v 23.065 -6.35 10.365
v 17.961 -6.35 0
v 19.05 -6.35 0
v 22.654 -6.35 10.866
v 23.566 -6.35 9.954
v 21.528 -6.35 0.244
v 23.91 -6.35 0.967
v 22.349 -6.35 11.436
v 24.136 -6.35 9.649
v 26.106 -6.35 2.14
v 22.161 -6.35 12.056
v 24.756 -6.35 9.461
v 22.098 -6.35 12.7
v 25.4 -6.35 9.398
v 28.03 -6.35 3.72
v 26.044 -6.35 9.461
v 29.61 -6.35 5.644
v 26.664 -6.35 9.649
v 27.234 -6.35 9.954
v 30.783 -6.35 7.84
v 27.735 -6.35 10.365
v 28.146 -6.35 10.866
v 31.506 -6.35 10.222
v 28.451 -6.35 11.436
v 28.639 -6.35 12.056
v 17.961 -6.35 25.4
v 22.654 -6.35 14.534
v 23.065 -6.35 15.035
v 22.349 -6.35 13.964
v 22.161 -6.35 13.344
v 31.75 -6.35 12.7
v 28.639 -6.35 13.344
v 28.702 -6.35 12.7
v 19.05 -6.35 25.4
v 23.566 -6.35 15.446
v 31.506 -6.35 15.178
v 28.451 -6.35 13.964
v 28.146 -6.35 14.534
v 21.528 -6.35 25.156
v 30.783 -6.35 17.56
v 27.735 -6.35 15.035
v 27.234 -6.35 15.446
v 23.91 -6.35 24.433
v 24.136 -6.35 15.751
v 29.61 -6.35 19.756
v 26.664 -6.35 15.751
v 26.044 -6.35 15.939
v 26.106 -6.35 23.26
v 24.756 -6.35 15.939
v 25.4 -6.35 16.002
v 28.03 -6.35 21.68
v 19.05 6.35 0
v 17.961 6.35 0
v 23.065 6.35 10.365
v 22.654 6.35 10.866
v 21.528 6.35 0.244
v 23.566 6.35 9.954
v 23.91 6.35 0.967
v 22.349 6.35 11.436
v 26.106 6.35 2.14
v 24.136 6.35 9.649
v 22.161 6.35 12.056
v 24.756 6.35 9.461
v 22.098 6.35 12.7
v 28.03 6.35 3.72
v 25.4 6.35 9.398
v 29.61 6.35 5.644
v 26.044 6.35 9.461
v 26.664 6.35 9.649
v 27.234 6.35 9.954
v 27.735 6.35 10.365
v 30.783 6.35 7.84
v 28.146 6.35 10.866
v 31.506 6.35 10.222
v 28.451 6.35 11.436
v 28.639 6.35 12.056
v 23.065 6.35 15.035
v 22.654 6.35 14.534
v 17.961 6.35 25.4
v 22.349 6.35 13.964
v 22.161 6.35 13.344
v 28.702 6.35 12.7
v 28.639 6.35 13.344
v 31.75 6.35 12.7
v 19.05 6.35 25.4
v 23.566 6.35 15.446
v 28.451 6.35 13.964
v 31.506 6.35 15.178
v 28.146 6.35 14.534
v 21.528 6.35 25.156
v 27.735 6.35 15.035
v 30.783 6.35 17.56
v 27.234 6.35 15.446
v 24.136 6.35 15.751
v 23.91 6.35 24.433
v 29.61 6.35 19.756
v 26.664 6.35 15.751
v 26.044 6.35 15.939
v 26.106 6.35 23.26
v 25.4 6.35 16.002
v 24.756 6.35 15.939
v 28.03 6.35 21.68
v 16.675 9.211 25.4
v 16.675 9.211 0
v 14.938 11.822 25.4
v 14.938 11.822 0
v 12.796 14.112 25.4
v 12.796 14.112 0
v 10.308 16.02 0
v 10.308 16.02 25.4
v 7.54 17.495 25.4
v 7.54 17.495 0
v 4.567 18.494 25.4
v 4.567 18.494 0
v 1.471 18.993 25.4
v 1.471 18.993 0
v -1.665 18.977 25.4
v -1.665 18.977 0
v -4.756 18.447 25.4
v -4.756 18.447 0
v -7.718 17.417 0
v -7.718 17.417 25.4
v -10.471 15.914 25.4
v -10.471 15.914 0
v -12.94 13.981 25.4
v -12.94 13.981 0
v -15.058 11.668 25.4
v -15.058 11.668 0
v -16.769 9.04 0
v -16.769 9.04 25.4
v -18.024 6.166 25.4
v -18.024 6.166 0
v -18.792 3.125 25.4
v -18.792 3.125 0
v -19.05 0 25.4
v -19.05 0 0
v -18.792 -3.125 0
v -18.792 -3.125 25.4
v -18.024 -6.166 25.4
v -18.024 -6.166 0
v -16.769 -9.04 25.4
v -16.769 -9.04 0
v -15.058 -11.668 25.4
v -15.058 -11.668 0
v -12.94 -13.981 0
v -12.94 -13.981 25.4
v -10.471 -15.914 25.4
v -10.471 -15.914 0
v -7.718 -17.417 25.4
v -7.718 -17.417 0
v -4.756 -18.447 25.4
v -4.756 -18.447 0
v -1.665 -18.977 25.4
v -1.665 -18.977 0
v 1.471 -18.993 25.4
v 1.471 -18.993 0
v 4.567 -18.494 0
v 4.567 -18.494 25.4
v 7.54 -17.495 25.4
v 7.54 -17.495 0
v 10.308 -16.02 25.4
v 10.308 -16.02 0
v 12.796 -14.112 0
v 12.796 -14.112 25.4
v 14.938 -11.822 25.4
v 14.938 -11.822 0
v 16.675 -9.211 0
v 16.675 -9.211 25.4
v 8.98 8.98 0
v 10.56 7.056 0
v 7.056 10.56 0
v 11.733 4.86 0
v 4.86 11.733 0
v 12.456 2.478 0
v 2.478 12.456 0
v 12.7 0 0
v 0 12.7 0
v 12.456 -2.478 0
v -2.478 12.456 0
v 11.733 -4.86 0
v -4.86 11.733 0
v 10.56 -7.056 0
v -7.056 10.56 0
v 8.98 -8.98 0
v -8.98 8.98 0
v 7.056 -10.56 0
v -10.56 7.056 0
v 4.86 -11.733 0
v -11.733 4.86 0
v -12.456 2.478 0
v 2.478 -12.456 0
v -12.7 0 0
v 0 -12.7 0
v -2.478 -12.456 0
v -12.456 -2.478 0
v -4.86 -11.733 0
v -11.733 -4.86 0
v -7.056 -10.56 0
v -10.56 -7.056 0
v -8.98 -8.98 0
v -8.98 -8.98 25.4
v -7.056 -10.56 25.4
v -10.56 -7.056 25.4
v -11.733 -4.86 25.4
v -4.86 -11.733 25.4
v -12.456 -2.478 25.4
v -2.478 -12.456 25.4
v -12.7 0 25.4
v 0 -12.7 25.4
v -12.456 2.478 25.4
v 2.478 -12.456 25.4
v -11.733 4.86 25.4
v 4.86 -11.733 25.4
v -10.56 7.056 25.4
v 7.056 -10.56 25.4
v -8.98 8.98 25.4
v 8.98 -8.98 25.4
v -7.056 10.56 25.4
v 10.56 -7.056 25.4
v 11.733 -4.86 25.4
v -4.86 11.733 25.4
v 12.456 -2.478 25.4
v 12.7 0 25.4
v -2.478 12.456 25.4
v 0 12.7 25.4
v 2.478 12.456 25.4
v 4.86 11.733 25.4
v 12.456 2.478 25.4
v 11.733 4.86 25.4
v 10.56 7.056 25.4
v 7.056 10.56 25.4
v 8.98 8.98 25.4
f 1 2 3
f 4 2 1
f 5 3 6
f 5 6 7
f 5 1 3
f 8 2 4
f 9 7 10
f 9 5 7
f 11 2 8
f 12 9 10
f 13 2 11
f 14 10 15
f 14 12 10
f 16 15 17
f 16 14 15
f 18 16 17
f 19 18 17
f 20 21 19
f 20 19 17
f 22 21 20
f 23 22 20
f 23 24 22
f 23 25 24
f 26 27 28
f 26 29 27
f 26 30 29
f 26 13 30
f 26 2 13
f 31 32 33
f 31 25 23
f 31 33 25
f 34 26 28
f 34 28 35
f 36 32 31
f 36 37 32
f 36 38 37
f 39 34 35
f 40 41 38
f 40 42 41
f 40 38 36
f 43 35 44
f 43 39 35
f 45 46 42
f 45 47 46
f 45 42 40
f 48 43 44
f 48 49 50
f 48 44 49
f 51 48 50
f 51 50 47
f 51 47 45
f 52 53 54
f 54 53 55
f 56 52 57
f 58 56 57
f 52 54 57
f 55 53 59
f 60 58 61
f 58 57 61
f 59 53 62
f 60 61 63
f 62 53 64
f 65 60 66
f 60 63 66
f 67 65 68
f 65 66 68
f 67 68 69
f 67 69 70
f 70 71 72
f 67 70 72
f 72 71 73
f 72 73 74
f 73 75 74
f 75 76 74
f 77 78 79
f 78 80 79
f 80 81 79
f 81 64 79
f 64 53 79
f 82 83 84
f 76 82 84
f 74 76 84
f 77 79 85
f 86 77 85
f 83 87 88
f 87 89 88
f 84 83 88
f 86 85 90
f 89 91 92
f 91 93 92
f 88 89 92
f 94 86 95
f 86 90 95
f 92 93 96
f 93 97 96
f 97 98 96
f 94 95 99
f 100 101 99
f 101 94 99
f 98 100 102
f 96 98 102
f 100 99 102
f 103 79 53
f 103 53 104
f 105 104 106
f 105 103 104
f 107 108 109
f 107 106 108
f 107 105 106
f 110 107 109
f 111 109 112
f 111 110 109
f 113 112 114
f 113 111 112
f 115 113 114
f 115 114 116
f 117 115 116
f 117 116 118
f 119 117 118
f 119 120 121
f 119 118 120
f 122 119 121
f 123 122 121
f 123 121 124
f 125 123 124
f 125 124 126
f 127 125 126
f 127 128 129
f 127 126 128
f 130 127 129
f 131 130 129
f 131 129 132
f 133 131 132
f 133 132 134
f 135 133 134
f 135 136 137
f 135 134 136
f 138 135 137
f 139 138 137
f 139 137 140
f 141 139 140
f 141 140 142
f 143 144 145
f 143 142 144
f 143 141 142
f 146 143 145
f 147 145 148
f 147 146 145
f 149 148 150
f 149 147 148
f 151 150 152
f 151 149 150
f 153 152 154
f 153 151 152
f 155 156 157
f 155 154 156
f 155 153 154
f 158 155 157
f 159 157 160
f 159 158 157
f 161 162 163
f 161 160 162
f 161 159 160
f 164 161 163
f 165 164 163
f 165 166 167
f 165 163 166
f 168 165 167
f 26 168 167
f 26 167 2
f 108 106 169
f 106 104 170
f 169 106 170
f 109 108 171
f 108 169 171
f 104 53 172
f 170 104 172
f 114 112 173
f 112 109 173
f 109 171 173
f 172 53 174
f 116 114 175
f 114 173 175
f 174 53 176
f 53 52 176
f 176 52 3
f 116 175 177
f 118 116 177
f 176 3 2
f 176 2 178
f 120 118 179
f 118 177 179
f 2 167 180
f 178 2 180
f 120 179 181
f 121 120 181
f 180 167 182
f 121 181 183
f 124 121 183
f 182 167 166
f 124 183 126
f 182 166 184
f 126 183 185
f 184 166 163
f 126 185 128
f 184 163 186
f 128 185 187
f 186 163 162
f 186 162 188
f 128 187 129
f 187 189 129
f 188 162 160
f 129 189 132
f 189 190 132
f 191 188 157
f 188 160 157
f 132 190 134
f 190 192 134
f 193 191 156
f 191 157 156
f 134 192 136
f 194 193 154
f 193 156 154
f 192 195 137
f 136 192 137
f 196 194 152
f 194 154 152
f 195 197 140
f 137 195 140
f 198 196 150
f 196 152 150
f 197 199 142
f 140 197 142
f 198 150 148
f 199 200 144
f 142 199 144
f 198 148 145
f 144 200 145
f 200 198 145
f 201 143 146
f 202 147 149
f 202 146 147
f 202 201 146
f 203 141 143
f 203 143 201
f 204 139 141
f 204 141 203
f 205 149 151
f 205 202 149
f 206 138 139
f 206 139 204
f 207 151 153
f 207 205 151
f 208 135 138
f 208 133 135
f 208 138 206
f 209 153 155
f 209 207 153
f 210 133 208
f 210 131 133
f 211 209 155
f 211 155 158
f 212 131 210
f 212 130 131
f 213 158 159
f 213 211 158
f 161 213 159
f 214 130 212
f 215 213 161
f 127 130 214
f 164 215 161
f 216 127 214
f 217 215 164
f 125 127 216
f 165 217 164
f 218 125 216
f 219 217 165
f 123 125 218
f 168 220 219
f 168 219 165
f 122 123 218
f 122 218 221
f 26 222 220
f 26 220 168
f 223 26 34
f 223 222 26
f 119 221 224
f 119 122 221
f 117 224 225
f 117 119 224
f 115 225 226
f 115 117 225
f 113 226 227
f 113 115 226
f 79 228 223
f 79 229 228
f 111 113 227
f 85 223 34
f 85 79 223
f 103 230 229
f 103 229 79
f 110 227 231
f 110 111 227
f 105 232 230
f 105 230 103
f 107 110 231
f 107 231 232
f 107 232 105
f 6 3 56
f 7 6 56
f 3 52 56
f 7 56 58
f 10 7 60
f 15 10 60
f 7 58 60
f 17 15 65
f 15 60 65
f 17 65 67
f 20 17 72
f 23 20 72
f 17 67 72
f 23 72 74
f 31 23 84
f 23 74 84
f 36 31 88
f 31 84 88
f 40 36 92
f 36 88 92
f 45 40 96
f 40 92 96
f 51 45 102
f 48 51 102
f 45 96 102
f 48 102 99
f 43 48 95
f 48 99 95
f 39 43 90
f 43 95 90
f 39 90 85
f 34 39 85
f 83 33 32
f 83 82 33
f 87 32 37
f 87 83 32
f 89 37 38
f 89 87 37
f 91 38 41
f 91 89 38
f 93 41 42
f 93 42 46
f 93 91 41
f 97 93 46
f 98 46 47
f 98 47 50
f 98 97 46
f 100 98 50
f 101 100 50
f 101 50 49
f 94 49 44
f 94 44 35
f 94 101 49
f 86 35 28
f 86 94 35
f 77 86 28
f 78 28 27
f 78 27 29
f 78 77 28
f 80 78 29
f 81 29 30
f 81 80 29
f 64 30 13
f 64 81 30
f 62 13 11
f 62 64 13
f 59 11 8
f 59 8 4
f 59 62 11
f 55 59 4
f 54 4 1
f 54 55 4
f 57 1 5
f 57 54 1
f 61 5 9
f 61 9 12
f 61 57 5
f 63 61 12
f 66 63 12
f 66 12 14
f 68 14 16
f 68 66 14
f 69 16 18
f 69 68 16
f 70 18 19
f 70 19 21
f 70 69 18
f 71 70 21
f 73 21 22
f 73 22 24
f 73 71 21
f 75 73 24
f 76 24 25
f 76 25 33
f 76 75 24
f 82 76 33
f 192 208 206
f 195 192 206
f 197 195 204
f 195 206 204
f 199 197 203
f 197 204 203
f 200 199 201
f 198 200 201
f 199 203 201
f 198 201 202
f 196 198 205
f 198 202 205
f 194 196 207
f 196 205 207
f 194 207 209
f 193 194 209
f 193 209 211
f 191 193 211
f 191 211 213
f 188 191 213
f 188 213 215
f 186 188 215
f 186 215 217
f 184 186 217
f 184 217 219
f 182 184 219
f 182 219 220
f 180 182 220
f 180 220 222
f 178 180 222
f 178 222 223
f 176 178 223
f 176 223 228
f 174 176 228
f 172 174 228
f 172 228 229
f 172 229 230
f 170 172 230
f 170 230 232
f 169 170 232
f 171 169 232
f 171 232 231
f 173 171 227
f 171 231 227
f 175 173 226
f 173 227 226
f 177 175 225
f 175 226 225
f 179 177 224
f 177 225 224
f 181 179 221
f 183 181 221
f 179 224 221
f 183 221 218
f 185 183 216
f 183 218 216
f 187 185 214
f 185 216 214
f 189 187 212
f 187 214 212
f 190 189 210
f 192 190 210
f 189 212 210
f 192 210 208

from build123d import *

# Parameters (mm, degrees)
F0_W          = 6.35
F0_H          = 25.4
F3_W          = 6.35
F3_H          = 25.4
F3_R          = 3.301997
F4_DEPTH      = 6.35
F4_DEPTH_BACK = 6.35


with BuildPart() as f2:
    # F0 (on Front) → F2 (revolve)
    with BuildSketch(Plane.XZ):
        with Locations((-15.875, 12.7)):
            Rectangle(F0_W, F0_H)
    revolve(axis=Axis((0, 0, 24.002999), (0, 0, 1)))

    # F3 (on Front) → F4 (join, two sides)
    with BuildSketch(Plane.XZ) as f4_sk:
        with Locations((15.875, 12.7)):
            Rectangle(F3_W, F3_H)
        with BuildLine():
            ThreePointArc((19.05, 0), (31.75, 12.7), (19.05, 25.4))
            Line((19.05, 25.4), (19.05, 0))
        make_face()
        with Locations((25.4, 12.7)):
            Circle(F3_R, mode=Mode.SUBTRACT)
    extrude(amount=F4_DEPTH)
    extrude(f4_sk.sketch, amount=-F4_DEPTH_BACK)


solid = f2.part
